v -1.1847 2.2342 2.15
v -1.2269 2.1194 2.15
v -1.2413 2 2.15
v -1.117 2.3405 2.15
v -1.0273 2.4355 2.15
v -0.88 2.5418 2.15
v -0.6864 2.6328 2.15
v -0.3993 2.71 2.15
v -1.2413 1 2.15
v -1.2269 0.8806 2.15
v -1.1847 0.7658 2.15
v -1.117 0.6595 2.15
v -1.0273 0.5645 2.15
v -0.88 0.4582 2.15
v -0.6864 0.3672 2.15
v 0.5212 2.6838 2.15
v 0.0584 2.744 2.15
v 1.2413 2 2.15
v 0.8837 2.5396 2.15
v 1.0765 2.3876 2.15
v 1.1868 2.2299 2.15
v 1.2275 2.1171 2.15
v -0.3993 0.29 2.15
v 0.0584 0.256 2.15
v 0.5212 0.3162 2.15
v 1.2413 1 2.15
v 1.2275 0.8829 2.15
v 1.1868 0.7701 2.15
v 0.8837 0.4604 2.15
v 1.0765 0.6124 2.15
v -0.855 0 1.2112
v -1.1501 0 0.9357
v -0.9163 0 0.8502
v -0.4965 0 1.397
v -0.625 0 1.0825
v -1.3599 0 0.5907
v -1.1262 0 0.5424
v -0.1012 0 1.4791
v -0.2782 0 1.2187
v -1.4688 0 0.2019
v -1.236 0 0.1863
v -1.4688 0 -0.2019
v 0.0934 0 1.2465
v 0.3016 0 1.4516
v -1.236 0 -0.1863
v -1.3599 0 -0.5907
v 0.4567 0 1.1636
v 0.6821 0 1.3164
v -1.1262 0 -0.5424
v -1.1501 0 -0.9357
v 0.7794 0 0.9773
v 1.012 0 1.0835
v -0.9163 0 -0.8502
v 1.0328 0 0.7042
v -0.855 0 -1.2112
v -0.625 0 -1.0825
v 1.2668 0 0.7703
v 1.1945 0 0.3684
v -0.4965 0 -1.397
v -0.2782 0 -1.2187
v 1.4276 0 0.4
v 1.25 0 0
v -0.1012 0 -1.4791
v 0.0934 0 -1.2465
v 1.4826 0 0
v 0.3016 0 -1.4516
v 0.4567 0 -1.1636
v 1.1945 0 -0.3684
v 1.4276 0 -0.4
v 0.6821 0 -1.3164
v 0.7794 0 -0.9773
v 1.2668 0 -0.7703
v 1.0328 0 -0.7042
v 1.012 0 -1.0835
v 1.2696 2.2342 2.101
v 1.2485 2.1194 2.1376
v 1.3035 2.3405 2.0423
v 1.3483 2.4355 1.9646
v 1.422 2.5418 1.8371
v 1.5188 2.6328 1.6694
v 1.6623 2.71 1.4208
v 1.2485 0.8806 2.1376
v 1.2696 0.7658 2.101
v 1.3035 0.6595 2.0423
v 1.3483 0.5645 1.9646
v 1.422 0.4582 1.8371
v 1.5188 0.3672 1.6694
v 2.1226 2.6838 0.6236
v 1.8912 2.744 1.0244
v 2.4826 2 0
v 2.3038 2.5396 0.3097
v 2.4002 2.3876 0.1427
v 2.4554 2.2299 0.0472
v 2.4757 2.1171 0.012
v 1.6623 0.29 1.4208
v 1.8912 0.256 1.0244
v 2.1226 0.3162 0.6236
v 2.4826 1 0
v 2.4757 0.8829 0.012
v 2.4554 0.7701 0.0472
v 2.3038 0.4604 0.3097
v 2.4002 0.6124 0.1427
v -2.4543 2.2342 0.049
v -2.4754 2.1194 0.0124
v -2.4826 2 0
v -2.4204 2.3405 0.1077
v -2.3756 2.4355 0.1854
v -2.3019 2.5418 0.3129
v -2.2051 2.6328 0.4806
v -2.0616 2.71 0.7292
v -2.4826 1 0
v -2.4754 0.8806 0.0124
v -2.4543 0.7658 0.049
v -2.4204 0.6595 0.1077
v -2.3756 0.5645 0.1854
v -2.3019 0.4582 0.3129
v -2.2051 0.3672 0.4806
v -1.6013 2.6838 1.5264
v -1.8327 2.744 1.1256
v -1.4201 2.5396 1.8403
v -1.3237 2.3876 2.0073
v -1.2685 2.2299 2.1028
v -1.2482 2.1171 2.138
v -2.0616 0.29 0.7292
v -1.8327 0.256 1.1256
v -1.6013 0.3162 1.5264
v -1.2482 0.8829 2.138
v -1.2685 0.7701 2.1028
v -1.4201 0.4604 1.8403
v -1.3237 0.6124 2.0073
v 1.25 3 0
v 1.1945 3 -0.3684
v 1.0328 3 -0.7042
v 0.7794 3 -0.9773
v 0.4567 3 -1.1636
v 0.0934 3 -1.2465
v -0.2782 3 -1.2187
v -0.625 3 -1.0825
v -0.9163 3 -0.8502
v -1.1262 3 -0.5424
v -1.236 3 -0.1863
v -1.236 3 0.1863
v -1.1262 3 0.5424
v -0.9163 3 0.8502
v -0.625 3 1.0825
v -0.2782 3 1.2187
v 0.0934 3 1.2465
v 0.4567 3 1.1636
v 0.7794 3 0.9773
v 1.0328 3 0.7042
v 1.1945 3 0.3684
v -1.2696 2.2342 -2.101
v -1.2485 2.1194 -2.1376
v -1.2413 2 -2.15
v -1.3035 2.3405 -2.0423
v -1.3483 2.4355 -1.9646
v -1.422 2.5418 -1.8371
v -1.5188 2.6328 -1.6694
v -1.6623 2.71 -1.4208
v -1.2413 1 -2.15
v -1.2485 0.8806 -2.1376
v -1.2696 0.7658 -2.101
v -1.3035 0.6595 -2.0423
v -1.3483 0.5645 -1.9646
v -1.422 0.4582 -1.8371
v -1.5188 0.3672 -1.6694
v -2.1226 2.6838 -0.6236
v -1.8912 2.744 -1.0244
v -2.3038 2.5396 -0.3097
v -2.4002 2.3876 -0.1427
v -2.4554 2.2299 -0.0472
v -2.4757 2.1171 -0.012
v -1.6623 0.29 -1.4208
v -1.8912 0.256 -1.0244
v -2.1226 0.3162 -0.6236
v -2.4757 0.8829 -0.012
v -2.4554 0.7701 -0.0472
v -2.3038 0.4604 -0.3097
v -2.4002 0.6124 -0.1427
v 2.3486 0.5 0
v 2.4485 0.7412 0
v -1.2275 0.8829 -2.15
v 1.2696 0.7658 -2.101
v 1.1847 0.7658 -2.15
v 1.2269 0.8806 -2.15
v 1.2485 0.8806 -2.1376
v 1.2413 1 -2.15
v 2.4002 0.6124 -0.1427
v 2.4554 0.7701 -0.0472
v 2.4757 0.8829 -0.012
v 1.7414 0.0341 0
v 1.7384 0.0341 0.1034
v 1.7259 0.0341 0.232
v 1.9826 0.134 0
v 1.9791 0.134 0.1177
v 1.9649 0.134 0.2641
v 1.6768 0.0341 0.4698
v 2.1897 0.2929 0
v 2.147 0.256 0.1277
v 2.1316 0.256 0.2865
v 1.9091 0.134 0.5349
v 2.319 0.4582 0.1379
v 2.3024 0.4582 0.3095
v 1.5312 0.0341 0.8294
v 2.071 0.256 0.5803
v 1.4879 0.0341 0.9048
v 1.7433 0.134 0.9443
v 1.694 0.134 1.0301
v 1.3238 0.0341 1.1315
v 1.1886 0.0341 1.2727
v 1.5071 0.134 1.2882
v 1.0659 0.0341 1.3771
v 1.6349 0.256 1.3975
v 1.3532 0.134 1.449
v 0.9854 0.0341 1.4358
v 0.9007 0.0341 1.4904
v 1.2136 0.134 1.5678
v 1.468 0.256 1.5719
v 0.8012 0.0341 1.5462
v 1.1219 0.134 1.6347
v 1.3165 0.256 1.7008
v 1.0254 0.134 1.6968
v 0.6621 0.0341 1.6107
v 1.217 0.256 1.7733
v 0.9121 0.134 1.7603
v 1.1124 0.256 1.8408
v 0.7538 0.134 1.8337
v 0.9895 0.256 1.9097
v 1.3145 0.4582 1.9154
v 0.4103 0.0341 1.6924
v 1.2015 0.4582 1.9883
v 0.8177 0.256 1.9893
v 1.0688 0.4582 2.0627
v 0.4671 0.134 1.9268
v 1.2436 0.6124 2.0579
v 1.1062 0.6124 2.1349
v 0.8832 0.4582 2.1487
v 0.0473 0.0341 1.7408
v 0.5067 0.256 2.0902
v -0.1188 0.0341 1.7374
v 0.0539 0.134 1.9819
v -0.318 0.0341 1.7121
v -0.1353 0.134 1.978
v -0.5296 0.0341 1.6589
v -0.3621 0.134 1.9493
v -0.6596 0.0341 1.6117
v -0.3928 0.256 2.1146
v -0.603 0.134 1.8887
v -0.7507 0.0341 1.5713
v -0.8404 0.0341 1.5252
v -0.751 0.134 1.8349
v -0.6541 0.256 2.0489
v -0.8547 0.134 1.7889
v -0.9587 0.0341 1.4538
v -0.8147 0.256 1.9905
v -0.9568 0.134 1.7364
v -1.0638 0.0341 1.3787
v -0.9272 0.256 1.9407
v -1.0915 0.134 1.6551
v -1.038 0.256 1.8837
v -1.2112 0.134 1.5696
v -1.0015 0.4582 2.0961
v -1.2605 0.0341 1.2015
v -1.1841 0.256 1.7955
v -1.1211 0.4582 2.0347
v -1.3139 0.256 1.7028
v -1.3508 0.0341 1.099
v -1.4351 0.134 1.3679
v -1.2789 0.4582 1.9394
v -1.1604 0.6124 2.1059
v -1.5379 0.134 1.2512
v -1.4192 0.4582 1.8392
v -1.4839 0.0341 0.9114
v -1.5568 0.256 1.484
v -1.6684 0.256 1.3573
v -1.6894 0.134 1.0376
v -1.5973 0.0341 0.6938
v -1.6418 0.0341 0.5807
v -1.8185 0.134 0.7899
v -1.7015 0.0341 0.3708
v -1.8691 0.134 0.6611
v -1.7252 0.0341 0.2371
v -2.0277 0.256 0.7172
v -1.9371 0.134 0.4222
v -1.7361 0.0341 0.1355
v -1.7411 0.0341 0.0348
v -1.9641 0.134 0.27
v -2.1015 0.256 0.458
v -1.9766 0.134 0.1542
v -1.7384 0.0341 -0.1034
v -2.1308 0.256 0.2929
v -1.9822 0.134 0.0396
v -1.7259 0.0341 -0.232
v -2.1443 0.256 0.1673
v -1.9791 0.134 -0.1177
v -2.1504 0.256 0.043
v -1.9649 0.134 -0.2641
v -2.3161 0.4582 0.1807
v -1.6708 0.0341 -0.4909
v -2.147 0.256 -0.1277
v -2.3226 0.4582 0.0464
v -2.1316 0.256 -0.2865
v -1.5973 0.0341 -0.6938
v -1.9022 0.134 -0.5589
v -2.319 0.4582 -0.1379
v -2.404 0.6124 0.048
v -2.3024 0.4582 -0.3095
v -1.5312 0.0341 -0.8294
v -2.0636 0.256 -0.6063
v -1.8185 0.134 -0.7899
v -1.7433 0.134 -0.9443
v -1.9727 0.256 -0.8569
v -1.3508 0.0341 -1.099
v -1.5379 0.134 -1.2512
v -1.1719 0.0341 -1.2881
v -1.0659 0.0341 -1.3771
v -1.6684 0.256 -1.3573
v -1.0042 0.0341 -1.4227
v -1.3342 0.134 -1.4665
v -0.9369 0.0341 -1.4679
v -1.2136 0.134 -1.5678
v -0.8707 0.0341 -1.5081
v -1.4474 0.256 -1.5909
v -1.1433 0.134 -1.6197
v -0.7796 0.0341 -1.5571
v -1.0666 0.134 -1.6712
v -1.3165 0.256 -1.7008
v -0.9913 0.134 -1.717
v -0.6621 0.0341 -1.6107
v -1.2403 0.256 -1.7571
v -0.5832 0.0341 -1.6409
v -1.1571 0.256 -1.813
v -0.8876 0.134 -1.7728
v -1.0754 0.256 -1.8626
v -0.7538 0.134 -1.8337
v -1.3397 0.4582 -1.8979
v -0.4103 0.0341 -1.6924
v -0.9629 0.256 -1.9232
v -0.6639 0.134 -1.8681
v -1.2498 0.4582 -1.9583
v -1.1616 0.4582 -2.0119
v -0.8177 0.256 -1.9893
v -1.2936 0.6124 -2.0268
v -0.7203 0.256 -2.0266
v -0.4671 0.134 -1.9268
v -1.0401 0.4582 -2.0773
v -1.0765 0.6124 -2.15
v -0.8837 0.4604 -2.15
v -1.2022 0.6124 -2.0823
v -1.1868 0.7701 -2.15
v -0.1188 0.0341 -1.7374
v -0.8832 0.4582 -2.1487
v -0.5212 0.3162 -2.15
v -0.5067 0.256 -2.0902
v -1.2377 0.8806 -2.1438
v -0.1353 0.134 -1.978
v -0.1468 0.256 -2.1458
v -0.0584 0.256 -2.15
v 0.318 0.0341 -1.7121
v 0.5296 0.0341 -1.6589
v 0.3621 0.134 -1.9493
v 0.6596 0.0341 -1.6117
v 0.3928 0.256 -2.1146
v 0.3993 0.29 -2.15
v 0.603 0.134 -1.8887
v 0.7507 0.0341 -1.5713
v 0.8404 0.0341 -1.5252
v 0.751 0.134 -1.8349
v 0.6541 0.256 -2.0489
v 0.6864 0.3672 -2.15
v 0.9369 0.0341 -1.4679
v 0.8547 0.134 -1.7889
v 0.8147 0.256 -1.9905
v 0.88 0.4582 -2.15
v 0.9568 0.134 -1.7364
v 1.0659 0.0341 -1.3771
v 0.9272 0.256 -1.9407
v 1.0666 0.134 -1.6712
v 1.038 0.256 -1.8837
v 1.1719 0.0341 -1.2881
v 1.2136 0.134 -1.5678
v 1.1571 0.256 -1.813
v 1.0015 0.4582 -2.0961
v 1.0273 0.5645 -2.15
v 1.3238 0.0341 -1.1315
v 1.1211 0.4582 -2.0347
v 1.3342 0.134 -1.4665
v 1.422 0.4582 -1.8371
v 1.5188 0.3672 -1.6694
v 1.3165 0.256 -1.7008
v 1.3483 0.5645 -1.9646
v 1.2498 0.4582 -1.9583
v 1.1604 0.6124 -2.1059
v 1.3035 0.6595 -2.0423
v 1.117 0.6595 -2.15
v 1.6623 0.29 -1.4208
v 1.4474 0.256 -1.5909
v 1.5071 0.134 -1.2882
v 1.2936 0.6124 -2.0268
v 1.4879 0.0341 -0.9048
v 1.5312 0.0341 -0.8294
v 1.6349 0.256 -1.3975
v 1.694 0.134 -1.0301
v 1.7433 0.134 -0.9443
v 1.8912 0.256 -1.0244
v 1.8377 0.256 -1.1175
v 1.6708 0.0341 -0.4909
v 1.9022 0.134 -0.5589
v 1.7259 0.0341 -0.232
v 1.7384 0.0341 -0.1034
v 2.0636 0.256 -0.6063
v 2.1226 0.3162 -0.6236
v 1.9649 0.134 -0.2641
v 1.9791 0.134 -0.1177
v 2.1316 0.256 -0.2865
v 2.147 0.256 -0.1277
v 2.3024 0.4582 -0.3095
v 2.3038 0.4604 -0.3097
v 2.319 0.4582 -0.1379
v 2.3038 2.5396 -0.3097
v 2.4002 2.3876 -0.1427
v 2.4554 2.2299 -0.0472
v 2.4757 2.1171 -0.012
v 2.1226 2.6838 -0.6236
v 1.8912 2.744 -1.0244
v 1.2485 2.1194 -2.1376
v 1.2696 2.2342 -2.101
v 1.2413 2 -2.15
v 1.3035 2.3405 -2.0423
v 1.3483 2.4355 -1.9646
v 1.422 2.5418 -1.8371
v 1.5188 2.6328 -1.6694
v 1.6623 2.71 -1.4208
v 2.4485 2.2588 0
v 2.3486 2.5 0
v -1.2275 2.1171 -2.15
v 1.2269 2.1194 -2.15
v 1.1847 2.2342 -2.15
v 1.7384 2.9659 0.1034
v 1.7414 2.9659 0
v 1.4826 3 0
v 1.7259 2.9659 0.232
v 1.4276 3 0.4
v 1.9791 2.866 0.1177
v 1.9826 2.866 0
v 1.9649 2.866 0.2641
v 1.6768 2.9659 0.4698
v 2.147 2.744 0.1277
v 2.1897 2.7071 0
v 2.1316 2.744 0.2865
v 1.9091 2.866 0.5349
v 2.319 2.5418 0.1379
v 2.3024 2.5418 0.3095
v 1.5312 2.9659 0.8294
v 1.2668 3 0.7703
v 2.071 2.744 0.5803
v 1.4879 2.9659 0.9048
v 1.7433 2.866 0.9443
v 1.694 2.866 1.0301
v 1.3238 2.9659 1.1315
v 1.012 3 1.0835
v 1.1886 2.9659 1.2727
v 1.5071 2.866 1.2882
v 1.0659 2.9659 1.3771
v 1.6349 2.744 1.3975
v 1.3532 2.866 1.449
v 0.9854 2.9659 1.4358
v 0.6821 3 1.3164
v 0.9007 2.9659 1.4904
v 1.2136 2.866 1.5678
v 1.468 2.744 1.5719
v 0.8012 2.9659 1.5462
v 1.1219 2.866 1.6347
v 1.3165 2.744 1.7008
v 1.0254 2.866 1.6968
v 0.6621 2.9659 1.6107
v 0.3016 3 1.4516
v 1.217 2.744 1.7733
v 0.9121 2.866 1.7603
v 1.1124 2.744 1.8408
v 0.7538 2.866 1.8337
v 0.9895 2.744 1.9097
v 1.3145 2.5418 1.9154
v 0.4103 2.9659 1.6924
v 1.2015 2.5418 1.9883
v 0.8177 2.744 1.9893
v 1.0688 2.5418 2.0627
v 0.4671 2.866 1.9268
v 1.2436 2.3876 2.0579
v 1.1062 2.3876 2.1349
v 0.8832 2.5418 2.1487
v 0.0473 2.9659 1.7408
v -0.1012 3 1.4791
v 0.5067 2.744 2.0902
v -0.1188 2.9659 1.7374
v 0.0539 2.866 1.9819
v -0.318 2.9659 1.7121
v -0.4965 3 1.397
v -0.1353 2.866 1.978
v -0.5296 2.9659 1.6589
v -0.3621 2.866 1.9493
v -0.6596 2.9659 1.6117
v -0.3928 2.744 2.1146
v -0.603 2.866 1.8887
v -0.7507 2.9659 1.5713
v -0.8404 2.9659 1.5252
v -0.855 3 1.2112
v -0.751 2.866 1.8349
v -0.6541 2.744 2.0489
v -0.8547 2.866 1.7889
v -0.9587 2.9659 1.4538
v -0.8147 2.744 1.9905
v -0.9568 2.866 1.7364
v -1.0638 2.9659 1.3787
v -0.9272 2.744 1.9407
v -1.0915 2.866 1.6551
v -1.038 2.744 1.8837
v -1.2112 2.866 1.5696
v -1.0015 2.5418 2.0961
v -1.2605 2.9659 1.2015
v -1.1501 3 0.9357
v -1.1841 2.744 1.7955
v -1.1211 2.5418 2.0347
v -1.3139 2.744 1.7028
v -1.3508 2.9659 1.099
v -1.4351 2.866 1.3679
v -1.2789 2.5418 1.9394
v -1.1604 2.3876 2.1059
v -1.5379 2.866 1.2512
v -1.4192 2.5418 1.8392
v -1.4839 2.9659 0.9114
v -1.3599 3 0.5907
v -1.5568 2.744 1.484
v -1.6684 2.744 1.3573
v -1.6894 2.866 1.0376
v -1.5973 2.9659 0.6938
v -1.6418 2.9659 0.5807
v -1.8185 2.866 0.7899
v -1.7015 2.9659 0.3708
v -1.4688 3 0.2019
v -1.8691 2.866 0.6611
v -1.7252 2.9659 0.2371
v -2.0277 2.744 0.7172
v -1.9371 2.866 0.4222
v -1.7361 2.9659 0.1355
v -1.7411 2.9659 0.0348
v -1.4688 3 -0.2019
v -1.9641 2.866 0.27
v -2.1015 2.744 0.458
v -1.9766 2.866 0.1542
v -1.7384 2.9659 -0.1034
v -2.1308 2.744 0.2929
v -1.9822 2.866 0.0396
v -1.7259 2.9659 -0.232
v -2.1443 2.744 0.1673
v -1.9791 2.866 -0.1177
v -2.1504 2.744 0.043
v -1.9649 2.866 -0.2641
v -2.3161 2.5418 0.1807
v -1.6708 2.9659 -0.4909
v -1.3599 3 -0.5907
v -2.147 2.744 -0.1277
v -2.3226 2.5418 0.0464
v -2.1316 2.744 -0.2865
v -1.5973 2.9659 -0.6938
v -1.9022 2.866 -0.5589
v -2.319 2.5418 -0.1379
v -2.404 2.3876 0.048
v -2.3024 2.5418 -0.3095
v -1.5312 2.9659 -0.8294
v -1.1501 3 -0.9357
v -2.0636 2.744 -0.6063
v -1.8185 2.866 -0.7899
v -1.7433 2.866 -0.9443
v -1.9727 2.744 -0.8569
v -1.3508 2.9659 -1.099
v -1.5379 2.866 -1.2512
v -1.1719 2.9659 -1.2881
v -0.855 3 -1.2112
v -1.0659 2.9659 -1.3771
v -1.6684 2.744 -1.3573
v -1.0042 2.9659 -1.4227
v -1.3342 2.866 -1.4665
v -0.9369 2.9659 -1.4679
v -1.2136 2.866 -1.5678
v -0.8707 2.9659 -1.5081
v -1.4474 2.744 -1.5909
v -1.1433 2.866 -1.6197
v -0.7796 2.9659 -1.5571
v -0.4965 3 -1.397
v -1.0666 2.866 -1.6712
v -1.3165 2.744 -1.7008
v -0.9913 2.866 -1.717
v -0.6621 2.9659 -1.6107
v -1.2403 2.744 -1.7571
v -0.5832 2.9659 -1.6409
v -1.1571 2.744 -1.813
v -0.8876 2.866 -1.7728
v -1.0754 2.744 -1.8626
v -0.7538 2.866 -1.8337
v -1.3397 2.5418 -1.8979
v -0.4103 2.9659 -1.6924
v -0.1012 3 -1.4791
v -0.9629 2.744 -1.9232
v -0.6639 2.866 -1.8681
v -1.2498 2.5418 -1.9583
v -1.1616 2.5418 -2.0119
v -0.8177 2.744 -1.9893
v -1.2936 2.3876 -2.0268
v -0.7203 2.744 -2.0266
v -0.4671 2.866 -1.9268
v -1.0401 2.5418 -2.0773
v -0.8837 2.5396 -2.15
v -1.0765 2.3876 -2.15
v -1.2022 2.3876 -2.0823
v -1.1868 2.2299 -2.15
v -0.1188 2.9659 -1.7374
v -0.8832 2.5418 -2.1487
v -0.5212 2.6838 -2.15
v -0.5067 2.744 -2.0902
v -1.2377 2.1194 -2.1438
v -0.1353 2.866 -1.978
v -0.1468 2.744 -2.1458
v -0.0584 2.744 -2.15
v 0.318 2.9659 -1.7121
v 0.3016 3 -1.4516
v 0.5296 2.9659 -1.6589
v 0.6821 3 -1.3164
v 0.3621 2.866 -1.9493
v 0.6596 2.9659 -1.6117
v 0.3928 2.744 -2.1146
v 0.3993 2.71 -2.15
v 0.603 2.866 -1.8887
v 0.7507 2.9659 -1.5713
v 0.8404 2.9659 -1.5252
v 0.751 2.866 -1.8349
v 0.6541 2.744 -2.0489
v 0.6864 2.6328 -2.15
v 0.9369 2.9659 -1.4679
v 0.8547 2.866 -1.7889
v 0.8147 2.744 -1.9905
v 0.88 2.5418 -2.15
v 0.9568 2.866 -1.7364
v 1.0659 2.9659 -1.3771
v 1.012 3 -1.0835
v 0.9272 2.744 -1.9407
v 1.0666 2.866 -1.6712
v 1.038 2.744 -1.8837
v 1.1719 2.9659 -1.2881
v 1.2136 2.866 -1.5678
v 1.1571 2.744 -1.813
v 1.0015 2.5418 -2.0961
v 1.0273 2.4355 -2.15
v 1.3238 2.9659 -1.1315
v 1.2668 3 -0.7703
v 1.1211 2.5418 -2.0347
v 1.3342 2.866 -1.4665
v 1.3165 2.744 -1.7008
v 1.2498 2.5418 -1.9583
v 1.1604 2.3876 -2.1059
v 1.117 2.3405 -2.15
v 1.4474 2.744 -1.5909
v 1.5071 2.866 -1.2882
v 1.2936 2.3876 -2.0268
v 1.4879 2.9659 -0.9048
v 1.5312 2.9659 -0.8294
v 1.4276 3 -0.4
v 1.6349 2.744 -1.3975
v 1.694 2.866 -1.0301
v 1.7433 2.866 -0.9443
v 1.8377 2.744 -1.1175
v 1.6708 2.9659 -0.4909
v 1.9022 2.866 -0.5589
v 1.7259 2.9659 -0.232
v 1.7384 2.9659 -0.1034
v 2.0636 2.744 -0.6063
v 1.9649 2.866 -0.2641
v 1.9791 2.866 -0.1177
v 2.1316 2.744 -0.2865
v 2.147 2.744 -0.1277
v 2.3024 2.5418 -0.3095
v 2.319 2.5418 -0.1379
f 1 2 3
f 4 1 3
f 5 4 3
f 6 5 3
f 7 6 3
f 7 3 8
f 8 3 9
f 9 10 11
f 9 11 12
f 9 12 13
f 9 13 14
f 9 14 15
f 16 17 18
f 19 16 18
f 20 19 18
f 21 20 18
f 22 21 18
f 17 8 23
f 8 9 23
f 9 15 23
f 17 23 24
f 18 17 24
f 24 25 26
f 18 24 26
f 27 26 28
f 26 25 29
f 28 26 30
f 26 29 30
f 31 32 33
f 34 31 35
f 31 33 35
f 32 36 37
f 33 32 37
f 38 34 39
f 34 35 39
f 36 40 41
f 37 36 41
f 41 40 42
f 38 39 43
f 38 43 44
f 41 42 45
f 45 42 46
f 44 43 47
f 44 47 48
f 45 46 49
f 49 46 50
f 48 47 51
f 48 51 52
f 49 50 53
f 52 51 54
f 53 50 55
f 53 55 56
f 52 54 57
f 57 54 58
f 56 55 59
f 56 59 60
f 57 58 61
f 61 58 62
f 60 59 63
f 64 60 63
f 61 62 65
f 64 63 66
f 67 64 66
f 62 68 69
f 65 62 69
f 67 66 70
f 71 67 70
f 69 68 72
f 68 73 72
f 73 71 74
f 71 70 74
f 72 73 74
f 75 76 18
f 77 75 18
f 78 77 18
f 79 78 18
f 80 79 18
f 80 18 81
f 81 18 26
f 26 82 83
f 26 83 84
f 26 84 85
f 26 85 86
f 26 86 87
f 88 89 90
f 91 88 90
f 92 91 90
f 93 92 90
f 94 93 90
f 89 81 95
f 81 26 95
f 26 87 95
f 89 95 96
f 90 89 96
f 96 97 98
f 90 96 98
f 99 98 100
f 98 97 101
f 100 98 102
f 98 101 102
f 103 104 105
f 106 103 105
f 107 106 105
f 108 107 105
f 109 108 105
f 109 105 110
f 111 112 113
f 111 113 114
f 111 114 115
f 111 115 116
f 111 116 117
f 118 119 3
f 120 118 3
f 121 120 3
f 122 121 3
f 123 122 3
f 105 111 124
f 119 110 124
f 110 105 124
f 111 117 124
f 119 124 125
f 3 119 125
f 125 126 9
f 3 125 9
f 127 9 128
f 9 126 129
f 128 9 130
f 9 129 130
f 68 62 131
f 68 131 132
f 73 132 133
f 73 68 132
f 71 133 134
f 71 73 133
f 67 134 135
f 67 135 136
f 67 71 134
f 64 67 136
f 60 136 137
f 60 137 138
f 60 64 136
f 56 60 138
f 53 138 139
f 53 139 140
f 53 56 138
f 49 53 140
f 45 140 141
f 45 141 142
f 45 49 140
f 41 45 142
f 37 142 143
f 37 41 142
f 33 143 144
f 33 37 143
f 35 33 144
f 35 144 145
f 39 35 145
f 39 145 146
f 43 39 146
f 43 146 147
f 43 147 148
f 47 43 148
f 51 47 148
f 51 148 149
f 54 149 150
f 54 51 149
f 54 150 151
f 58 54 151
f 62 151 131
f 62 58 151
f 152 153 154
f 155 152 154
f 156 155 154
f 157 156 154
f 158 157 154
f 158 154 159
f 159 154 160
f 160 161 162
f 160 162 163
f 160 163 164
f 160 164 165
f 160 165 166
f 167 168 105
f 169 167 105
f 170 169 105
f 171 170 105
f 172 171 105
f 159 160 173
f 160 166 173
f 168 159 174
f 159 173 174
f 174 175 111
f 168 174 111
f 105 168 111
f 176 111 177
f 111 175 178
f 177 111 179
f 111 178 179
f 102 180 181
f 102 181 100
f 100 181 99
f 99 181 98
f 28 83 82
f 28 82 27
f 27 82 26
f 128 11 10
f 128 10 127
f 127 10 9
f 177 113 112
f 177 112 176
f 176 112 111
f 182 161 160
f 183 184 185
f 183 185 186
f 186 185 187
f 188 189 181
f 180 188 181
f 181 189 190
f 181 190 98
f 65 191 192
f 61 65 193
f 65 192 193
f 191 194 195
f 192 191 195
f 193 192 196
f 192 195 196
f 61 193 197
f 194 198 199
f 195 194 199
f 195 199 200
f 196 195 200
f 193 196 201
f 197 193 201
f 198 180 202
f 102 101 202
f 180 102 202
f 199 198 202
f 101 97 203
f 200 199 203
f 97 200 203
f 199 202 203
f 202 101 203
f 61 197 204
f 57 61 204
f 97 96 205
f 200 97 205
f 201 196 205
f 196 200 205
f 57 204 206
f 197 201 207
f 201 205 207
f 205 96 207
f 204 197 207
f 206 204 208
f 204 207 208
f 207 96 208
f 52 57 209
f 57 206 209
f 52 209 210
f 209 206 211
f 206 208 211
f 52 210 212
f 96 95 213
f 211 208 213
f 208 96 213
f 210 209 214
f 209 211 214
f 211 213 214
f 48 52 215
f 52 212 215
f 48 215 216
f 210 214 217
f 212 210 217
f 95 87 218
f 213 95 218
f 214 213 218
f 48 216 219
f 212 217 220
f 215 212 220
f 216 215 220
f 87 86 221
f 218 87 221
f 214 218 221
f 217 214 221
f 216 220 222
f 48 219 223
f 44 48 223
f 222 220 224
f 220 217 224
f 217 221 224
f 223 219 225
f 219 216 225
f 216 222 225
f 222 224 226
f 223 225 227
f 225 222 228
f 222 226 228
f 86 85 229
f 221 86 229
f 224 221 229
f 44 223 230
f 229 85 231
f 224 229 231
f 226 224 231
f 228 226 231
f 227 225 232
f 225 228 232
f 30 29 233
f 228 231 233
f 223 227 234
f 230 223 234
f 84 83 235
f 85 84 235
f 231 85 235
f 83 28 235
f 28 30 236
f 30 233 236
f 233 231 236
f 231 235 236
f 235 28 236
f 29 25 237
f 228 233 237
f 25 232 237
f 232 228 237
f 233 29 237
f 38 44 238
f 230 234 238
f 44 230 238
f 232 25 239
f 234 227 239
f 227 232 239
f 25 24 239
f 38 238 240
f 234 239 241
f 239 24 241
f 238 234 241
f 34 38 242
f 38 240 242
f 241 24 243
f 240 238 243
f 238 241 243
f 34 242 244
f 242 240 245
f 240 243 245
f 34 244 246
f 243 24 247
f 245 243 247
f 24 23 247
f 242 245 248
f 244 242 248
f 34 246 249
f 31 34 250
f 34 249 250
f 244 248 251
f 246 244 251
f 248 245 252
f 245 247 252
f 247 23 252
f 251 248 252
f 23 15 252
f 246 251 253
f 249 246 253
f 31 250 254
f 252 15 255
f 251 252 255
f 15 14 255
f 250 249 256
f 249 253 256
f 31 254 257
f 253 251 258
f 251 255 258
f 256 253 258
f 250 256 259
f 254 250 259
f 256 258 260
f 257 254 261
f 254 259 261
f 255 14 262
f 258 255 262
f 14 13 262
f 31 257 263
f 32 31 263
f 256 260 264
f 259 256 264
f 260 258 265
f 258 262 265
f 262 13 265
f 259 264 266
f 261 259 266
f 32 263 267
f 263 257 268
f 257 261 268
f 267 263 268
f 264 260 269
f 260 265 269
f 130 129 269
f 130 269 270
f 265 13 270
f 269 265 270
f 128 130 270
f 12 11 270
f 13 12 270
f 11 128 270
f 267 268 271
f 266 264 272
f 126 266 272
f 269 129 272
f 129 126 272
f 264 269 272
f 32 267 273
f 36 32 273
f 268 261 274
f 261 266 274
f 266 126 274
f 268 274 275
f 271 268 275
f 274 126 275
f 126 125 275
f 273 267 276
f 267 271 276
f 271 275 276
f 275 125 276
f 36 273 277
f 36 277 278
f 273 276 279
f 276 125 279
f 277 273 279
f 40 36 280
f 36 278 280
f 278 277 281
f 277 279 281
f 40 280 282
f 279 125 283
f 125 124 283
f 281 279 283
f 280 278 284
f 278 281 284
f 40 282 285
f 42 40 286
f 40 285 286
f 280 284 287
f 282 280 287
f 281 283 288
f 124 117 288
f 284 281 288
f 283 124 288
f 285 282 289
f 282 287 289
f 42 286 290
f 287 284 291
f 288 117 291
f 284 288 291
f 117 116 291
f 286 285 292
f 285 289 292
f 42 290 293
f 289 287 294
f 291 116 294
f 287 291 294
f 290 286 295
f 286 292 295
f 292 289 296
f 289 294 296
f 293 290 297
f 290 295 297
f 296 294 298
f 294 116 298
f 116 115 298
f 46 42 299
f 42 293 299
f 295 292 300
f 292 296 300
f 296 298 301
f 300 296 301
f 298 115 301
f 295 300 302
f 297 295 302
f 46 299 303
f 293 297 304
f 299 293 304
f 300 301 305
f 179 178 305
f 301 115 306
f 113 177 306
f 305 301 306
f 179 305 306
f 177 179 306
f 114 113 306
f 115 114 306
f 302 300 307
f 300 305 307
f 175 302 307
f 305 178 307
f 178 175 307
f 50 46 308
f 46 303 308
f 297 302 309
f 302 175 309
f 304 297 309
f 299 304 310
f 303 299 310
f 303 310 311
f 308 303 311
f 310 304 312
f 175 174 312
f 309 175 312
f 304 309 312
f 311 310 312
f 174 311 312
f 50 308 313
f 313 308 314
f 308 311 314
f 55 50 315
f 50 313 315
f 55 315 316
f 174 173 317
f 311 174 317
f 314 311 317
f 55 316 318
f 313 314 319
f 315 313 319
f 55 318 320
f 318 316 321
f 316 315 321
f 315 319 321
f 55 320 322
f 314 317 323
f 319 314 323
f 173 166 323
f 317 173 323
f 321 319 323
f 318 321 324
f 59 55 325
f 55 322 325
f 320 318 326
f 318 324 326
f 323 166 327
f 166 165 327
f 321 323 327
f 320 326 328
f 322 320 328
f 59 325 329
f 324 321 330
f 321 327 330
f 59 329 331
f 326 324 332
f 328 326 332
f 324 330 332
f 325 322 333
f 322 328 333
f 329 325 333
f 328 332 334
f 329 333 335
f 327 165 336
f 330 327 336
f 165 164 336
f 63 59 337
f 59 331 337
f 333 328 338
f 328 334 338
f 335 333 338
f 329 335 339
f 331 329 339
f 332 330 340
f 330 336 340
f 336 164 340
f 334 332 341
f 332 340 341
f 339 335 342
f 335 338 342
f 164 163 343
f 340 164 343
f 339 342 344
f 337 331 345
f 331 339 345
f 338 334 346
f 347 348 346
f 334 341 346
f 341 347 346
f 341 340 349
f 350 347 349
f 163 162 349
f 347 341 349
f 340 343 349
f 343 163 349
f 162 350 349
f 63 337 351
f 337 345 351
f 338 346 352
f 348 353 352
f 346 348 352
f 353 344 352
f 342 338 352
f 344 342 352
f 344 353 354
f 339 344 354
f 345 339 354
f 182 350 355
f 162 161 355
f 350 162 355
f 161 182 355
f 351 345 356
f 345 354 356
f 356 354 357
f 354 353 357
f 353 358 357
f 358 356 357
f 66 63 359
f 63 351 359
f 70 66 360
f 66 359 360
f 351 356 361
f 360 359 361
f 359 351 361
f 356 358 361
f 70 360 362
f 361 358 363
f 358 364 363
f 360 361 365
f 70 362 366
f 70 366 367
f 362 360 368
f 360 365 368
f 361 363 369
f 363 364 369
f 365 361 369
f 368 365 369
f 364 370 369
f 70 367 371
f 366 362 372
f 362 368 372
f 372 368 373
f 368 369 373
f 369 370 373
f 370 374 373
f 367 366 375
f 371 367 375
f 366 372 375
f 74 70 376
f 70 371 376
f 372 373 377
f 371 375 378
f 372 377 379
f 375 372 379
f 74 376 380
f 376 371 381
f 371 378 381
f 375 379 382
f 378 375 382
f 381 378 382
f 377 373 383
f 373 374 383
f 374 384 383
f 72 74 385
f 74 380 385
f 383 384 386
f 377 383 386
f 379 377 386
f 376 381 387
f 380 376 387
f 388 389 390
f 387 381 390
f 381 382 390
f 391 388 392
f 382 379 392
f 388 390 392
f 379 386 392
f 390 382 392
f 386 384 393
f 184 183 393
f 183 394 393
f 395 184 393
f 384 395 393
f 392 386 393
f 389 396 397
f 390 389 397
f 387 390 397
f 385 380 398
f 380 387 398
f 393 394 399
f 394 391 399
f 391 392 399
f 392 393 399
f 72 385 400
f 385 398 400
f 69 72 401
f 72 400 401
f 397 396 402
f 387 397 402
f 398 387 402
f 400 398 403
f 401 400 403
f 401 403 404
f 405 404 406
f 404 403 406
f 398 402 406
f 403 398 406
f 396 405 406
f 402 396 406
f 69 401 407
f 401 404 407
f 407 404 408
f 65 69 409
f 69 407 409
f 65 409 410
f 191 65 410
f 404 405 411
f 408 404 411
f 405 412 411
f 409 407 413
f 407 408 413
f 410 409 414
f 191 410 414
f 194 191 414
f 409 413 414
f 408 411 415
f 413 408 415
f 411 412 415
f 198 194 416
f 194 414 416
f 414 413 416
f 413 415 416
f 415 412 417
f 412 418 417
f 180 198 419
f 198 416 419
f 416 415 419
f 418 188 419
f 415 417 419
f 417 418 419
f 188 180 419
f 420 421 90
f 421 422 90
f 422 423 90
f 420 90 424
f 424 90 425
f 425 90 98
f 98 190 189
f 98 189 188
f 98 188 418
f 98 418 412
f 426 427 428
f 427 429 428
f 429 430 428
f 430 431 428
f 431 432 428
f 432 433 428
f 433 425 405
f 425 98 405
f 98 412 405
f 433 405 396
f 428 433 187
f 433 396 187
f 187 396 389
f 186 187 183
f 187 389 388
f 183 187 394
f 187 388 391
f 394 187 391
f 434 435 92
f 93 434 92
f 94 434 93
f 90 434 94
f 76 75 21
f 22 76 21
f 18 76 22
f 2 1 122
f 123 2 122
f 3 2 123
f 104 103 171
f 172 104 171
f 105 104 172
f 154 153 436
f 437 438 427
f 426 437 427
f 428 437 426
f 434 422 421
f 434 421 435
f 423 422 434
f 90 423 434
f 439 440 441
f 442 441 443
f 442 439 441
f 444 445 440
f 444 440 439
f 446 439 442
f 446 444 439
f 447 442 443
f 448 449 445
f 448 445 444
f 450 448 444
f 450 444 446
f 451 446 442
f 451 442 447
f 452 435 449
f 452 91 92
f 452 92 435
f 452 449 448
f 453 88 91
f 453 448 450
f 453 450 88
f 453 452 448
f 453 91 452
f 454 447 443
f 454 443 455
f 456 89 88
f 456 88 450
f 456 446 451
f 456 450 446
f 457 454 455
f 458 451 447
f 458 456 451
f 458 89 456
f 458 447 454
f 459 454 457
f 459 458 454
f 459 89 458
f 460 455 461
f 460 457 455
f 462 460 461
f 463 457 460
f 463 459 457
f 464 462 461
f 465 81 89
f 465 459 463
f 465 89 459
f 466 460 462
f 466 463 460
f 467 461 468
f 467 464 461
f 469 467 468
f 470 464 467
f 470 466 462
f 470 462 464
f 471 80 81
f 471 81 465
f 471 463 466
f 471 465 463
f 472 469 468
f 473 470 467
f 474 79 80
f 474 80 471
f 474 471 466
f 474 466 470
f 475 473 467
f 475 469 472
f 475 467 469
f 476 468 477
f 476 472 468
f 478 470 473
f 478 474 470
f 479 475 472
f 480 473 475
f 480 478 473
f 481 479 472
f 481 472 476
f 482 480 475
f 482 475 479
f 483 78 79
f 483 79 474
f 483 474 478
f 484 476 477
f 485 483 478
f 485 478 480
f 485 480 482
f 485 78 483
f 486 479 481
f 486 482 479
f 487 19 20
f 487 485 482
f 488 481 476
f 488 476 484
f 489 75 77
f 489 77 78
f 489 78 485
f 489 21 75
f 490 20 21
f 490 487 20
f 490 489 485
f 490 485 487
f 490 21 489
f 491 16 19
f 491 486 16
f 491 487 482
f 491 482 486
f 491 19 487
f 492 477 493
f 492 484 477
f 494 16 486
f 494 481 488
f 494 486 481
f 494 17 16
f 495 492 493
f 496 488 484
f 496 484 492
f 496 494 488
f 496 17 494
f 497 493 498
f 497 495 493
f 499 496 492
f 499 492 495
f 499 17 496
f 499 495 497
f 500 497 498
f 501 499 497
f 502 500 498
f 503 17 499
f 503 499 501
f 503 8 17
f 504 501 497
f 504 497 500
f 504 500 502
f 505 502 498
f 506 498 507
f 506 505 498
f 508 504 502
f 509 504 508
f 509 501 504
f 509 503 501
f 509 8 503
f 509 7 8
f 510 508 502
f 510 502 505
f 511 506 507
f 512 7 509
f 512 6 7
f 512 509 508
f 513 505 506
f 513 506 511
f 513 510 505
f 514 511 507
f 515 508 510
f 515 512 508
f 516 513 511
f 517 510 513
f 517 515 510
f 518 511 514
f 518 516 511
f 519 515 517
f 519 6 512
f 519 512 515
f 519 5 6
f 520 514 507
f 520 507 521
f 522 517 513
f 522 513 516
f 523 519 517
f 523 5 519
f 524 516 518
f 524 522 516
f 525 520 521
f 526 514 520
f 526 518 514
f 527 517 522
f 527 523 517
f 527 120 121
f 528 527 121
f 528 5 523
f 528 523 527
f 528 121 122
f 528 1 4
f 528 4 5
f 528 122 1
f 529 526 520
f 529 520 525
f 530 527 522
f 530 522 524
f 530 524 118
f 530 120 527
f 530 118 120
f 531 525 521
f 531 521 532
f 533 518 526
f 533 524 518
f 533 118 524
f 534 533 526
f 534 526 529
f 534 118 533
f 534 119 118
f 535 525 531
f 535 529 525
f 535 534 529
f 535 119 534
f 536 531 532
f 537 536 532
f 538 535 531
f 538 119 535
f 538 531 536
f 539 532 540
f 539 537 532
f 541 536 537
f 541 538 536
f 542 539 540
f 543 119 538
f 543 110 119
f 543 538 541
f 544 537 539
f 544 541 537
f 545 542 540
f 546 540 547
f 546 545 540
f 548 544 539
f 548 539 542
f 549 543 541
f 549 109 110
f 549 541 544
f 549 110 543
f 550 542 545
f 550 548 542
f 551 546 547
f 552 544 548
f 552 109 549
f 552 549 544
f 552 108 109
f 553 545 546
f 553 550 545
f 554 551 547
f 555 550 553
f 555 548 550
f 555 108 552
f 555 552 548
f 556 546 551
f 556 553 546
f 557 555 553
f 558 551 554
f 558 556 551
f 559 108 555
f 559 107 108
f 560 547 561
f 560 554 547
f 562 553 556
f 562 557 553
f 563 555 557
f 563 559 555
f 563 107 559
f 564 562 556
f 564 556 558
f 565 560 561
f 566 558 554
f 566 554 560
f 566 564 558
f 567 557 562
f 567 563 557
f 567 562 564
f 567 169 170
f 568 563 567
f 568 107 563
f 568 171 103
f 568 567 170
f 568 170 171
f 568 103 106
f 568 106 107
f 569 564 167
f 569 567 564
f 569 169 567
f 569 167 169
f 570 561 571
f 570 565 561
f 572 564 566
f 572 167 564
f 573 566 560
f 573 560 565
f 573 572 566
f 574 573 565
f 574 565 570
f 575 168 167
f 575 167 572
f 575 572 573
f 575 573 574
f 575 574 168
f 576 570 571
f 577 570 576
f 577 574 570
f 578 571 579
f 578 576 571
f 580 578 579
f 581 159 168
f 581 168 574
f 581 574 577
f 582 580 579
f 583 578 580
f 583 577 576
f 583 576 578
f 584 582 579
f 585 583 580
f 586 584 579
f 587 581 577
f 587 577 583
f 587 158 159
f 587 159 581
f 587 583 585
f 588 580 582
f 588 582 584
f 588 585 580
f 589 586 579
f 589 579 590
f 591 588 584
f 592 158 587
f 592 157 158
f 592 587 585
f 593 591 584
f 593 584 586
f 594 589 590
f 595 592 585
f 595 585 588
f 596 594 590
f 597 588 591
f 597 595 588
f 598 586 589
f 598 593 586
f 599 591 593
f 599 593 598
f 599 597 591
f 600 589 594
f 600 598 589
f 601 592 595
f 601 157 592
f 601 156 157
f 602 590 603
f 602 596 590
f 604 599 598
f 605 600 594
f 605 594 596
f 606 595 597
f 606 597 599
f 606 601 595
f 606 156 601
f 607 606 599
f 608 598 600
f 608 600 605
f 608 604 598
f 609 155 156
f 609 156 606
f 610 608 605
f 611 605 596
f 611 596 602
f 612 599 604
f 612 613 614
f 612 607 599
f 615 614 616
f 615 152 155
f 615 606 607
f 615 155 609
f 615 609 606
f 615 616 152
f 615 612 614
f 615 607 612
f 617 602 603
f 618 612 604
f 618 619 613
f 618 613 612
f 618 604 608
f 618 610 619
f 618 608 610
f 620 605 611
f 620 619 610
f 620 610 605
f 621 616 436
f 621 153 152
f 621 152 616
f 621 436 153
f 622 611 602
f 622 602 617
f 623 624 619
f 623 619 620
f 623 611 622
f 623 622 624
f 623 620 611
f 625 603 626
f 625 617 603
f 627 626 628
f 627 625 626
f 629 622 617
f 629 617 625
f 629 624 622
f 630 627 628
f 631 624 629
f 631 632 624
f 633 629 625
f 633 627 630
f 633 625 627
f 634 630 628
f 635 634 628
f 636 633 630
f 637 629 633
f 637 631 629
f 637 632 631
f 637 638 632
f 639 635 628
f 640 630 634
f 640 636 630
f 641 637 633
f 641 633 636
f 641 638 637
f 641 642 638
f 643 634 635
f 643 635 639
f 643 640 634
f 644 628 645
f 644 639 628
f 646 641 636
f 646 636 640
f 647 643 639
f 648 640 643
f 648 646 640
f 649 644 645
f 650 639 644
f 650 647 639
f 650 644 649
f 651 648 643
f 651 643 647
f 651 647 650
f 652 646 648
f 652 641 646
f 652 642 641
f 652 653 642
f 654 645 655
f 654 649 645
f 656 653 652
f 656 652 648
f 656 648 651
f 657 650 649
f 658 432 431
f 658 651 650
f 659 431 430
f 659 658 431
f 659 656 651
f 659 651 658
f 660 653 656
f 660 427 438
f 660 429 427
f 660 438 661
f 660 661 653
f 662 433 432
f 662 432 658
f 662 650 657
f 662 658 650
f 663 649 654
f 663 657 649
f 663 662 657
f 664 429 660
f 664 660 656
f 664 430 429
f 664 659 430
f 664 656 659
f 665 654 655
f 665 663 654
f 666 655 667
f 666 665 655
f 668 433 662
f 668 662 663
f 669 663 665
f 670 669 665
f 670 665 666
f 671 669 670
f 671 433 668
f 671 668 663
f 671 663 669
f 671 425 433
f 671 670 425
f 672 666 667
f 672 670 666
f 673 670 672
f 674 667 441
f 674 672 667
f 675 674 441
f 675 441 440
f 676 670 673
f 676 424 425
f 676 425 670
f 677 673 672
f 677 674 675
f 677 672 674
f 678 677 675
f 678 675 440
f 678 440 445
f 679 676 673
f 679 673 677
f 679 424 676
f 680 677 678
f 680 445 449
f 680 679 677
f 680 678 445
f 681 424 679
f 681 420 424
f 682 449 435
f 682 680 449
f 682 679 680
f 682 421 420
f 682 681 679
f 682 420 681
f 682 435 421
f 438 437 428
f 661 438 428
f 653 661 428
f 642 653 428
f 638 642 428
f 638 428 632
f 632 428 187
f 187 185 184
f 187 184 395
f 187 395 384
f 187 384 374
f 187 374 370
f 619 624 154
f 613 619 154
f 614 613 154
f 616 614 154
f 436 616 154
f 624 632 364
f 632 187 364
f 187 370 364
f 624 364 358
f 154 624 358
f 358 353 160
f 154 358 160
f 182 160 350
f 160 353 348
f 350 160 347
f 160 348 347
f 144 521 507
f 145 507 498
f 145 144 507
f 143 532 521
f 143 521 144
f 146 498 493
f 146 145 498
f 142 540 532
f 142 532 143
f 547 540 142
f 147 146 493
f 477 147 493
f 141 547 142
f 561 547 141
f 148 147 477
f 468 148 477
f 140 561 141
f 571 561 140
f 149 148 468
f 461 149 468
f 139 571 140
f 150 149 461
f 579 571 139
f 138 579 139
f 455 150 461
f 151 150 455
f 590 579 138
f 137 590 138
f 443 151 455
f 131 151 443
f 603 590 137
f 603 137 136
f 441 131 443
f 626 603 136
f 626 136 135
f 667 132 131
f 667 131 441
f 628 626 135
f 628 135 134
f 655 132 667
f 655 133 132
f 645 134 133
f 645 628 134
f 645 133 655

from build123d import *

# Parameters (mm, degrees)
SKETCH2_R           = 1.25
BOSS_EXTRUDE1_DEPTH = 3


with BuildPart() as part:
    # Sketch2 → Boss-Extrude1 (new body)
    with BuildSketch(Plane(origin=(0, 0, 0), x_dir=(1, 0, 0), z_dir=(0, 1, 0))):
        Polygon((2.482606158, 0), (1.241303079, 2.15), (-1.241303079, 2.15), (-2.482606158, 0), (-1.241303079, -2.15), (1.241303079, -2.15), align=None)
        Circle(SKETCH2_R, mode=Mode.SUBTRACT)
    extrude(amount=BOSS_EXTRUDE1_DEPTH)

    # Sketch3 → Cut-Revolve1 (revolve, cut)
    with BuildSketch(Plane.XY):
        with BuildLine():
            Line((2.482606158, 0), (1.482606158, 0))
            ThreePointArc((1.482606158, 0), (2.189712939, 0.292893219), (2.482606158, 1))
            Line((2.482606158, 1), (2.482606158, 0))
        make_face()
        with BuildLine():
            Line((2.482606158, 3), (1.482606158, 3))
            ThreePointArc((1.482606158, 3), (2.189712939, 2.707106781), (2.482606158, 2))
            Line((2.482606158, 2), (2.482606158, 3))
        make_face()
    revolve(axis=Axis((0, 0, 0), (0, -1, 0)), mode=Mode.SUBTRACT)


solid = part.part
